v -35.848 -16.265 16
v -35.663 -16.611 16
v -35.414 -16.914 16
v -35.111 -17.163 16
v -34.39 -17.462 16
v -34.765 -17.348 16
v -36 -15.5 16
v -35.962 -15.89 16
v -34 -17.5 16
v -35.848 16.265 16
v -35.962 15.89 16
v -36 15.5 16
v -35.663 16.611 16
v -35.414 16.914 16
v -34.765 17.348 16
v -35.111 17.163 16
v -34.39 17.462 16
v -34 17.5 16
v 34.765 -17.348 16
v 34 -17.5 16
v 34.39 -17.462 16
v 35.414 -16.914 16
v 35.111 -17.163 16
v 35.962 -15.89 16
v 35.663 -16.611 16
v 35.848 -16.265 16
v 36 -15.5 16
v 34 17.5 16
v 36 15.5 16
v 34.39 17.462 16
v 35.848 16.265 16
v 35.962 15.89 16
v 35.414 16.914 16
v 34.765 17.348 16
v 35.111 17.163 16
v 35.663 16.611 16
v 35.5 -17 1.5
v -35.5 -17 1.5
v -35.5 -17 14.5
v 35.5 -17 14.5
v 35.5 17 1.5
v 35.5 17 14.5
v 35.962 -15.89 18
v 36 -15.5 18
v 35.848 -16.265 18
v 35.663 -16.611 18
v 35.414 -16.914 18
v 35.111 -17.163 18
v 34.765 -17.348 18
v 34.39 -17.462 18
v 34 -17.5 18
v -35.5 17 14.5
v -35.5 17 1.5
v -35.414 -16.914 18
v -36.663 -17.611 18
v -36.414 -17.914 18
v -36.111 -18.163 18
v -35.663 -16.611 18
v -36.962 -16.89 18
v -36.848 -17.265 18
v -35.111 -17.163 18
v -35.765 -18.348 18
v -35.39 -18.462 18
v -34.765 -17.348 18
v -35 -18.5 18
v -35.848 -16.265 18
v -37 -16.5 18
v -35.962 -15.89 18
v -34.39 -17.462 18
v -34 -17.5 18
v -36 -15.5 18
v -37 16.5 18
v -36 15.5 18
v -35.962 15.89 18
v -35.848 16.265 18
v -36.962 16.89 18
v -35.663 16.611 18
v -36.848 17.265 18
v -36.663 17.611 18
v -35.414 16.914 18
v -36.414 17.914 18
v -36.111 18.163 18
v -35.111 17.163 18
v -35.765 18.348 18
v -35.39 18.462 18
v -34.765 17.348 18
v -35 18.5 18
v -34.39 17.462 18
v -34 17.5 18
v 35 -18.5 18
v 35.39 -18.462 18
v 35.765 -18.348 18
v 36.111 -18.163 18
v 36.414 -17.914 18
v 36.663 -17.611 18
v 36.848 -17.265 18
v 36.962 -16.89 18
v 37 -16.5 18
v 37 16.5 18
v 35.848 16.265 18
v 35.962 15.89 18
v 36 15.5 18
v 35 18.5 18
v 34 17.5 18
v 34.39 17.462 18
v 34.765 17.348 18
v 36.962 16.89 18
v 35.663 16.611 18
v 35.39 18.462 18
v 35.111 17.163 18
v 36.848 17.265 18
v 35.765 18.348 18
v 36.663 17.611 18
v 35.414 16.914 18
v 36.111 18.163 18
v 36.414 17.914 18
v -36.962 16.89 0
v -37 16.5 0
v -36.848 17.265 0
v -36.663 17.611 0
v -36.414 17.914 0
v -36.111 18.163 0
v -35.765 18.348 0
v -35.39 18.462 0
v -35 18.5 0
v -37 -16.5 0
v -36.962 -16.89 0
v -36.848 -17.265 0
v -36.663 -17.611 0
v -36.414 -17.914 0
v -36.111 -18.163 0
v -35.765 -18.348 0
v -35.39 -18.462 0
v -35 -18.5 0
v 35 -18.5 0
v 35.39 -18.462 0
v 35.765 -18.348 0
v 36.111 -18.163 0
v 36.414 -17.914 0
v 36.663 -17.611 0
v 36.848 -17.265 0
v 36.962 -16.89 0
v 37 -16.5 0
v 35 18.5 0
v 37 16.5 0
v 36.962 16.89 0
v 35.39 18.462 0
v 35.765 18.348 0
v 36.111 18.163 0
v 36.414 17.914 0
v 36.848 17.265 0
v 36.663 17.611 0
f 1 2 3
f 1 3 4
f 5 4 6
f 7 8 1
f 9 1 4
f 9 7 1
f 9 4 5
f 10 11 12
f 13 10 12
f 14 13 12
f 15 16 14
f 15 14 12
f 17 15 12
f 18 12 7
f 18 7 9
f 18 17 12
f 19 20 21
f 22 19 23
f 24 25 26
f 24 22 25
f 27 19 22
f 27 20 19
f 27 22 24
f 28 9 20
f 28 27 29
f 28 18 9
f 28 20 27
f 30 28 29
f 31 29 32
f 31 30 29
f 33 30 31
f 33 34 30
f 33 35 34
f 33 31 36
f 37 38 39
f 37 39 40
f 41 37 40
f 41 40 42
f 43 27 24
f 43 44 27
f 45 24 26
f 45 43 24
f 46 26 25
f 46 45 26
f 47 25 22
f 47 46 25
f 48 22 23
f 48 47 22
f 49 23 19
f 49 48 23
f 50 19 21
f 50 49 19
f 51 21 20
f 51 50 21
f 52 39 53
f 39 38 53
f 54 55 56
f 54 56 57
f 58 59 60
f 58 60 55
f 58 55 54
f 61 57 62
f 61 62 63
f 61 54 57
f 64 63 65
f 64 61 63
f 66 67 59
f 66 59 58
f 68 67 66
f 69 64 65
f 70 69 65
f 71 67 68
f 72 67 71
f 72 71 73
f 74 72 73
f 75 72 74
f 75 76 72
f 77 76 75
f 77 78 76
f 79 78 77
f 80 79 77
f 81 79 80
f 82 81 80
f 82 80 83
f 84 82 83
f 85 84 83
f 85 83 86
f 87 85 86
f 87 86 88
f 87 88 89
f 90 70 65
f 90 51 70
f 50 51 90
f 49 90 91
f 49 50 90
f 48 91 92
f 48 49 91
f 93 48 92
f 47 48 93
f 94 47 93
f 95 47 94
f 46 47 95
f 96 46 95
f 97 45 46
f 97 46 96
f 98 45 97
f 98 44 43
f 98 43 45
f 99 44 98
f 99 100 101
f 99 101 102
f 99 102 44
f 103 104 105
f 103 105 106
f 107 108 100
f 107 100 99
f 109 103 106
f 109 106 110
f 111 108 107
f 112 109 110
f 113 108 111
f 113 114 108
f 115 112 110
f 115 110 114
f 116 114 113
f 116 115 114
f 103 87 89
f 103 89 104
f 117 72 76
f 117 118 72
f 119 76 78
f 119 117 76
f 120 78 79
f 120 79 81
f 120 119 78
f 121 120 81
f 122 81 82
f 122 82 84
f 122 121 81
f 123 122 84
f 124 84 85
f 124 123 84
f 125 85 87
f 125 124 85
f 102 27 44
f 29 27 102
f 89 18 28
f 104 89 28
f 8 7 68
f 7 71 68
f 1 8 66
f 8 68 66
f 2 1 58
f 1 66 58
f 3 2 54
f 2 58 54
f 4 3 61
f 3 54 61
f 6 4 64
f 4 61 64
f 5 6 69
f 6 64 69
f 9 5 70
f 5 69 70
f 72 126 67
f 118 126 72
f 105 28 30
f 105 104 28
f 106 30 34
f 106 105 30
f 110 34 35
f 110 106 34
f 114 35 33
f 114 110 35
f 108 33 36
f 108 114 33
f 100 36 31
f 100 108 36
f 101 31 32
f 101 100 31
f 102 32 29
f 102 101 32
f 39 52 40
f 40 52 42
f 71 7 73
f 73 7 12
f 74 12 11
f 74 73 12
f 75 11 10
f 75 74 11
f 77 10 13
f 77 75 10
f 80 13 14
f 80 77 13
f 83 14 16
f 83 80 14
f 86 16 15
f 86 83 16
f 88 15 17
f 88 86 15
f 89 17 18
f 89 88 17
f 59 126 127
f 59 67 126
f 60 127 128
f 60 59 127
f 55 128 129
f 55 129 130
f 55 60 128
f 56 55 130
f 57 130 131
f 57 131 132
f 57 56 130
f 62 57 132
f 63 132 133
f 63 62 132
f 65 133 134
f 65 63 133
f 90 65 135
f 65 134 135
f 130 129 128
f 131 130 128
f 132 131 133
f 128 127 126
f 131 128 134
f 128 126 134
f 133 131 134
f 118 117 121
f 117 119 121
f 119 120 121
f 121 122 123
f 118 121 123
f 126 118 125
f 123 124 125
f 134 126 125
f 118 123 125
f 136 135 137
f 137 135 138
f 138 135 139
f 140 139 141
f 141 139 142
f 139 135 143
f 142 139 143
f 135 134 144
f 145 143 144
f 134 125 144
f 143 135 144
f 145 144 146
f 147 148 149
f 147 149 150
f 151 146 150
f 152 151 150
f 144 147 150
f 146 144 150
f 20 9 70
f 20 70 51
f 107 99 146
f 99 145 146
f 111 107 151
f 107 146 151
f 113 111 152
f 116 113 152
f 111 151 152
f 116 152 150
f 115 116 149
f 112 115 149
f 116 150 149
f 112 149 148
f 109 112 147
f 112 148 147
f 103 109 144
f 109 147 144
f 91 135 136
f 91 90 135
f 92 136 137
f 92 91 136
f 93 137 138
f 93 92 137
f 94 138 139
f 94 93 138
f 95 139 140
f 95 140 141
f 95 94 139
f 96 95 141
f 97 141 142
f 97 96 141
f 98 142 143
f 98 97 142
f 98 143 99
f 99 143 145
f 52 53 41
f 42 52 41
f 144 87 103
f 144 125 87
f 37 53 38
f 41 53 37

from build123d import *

# Parameters (mm, degrees)
F0_W     = 74
F0_H     = 37
F1_DEPTH = 16
F2_T     = -1.5
F3_W     = 74
F3_H     = 37
F3_W_2   = 72
F3_H_2   = 35
F4_DEPTH = 2
F5_R     = 2


with BuildPart() as f1:
    # F0 (on Top) → F1 (new body)
    with BuildSketch(Plane.XY):
        Rectangle(F0_W, F0_H)
    extrude(amount=F1_DEPTH)

    # F2 (hollow: no face is removed)
    offset(amount=F2_T, mode=Mode.SUBTRACT)

    # F3 (on face) → F4 (join)
    with BuildSketch(Plane.XY.offset(16)):
        Rectangle(F3_W, F3_H)
        Rectangle(F3_W_2, F3_H_2, mode=Mode.SUBTRACT)
    extrude(amount=F4_DEPTH)

    # F5
    f5_edges = [f1.edges().sort_by_distance(p)[0] for p in [
        (-37, -18.5, 9),
        (36, 17.5, 17),
        (-36, 17.5, 17),
        (-36, -17.5, 17),
        (36, -17.5, 17),
        (37, -18.5, 9),
        (-37, 18.5, 9),
        (37, 18.5, 9),
    ]]
    fillet(f5_edges, radius=F5_R)


solid = f1.part
